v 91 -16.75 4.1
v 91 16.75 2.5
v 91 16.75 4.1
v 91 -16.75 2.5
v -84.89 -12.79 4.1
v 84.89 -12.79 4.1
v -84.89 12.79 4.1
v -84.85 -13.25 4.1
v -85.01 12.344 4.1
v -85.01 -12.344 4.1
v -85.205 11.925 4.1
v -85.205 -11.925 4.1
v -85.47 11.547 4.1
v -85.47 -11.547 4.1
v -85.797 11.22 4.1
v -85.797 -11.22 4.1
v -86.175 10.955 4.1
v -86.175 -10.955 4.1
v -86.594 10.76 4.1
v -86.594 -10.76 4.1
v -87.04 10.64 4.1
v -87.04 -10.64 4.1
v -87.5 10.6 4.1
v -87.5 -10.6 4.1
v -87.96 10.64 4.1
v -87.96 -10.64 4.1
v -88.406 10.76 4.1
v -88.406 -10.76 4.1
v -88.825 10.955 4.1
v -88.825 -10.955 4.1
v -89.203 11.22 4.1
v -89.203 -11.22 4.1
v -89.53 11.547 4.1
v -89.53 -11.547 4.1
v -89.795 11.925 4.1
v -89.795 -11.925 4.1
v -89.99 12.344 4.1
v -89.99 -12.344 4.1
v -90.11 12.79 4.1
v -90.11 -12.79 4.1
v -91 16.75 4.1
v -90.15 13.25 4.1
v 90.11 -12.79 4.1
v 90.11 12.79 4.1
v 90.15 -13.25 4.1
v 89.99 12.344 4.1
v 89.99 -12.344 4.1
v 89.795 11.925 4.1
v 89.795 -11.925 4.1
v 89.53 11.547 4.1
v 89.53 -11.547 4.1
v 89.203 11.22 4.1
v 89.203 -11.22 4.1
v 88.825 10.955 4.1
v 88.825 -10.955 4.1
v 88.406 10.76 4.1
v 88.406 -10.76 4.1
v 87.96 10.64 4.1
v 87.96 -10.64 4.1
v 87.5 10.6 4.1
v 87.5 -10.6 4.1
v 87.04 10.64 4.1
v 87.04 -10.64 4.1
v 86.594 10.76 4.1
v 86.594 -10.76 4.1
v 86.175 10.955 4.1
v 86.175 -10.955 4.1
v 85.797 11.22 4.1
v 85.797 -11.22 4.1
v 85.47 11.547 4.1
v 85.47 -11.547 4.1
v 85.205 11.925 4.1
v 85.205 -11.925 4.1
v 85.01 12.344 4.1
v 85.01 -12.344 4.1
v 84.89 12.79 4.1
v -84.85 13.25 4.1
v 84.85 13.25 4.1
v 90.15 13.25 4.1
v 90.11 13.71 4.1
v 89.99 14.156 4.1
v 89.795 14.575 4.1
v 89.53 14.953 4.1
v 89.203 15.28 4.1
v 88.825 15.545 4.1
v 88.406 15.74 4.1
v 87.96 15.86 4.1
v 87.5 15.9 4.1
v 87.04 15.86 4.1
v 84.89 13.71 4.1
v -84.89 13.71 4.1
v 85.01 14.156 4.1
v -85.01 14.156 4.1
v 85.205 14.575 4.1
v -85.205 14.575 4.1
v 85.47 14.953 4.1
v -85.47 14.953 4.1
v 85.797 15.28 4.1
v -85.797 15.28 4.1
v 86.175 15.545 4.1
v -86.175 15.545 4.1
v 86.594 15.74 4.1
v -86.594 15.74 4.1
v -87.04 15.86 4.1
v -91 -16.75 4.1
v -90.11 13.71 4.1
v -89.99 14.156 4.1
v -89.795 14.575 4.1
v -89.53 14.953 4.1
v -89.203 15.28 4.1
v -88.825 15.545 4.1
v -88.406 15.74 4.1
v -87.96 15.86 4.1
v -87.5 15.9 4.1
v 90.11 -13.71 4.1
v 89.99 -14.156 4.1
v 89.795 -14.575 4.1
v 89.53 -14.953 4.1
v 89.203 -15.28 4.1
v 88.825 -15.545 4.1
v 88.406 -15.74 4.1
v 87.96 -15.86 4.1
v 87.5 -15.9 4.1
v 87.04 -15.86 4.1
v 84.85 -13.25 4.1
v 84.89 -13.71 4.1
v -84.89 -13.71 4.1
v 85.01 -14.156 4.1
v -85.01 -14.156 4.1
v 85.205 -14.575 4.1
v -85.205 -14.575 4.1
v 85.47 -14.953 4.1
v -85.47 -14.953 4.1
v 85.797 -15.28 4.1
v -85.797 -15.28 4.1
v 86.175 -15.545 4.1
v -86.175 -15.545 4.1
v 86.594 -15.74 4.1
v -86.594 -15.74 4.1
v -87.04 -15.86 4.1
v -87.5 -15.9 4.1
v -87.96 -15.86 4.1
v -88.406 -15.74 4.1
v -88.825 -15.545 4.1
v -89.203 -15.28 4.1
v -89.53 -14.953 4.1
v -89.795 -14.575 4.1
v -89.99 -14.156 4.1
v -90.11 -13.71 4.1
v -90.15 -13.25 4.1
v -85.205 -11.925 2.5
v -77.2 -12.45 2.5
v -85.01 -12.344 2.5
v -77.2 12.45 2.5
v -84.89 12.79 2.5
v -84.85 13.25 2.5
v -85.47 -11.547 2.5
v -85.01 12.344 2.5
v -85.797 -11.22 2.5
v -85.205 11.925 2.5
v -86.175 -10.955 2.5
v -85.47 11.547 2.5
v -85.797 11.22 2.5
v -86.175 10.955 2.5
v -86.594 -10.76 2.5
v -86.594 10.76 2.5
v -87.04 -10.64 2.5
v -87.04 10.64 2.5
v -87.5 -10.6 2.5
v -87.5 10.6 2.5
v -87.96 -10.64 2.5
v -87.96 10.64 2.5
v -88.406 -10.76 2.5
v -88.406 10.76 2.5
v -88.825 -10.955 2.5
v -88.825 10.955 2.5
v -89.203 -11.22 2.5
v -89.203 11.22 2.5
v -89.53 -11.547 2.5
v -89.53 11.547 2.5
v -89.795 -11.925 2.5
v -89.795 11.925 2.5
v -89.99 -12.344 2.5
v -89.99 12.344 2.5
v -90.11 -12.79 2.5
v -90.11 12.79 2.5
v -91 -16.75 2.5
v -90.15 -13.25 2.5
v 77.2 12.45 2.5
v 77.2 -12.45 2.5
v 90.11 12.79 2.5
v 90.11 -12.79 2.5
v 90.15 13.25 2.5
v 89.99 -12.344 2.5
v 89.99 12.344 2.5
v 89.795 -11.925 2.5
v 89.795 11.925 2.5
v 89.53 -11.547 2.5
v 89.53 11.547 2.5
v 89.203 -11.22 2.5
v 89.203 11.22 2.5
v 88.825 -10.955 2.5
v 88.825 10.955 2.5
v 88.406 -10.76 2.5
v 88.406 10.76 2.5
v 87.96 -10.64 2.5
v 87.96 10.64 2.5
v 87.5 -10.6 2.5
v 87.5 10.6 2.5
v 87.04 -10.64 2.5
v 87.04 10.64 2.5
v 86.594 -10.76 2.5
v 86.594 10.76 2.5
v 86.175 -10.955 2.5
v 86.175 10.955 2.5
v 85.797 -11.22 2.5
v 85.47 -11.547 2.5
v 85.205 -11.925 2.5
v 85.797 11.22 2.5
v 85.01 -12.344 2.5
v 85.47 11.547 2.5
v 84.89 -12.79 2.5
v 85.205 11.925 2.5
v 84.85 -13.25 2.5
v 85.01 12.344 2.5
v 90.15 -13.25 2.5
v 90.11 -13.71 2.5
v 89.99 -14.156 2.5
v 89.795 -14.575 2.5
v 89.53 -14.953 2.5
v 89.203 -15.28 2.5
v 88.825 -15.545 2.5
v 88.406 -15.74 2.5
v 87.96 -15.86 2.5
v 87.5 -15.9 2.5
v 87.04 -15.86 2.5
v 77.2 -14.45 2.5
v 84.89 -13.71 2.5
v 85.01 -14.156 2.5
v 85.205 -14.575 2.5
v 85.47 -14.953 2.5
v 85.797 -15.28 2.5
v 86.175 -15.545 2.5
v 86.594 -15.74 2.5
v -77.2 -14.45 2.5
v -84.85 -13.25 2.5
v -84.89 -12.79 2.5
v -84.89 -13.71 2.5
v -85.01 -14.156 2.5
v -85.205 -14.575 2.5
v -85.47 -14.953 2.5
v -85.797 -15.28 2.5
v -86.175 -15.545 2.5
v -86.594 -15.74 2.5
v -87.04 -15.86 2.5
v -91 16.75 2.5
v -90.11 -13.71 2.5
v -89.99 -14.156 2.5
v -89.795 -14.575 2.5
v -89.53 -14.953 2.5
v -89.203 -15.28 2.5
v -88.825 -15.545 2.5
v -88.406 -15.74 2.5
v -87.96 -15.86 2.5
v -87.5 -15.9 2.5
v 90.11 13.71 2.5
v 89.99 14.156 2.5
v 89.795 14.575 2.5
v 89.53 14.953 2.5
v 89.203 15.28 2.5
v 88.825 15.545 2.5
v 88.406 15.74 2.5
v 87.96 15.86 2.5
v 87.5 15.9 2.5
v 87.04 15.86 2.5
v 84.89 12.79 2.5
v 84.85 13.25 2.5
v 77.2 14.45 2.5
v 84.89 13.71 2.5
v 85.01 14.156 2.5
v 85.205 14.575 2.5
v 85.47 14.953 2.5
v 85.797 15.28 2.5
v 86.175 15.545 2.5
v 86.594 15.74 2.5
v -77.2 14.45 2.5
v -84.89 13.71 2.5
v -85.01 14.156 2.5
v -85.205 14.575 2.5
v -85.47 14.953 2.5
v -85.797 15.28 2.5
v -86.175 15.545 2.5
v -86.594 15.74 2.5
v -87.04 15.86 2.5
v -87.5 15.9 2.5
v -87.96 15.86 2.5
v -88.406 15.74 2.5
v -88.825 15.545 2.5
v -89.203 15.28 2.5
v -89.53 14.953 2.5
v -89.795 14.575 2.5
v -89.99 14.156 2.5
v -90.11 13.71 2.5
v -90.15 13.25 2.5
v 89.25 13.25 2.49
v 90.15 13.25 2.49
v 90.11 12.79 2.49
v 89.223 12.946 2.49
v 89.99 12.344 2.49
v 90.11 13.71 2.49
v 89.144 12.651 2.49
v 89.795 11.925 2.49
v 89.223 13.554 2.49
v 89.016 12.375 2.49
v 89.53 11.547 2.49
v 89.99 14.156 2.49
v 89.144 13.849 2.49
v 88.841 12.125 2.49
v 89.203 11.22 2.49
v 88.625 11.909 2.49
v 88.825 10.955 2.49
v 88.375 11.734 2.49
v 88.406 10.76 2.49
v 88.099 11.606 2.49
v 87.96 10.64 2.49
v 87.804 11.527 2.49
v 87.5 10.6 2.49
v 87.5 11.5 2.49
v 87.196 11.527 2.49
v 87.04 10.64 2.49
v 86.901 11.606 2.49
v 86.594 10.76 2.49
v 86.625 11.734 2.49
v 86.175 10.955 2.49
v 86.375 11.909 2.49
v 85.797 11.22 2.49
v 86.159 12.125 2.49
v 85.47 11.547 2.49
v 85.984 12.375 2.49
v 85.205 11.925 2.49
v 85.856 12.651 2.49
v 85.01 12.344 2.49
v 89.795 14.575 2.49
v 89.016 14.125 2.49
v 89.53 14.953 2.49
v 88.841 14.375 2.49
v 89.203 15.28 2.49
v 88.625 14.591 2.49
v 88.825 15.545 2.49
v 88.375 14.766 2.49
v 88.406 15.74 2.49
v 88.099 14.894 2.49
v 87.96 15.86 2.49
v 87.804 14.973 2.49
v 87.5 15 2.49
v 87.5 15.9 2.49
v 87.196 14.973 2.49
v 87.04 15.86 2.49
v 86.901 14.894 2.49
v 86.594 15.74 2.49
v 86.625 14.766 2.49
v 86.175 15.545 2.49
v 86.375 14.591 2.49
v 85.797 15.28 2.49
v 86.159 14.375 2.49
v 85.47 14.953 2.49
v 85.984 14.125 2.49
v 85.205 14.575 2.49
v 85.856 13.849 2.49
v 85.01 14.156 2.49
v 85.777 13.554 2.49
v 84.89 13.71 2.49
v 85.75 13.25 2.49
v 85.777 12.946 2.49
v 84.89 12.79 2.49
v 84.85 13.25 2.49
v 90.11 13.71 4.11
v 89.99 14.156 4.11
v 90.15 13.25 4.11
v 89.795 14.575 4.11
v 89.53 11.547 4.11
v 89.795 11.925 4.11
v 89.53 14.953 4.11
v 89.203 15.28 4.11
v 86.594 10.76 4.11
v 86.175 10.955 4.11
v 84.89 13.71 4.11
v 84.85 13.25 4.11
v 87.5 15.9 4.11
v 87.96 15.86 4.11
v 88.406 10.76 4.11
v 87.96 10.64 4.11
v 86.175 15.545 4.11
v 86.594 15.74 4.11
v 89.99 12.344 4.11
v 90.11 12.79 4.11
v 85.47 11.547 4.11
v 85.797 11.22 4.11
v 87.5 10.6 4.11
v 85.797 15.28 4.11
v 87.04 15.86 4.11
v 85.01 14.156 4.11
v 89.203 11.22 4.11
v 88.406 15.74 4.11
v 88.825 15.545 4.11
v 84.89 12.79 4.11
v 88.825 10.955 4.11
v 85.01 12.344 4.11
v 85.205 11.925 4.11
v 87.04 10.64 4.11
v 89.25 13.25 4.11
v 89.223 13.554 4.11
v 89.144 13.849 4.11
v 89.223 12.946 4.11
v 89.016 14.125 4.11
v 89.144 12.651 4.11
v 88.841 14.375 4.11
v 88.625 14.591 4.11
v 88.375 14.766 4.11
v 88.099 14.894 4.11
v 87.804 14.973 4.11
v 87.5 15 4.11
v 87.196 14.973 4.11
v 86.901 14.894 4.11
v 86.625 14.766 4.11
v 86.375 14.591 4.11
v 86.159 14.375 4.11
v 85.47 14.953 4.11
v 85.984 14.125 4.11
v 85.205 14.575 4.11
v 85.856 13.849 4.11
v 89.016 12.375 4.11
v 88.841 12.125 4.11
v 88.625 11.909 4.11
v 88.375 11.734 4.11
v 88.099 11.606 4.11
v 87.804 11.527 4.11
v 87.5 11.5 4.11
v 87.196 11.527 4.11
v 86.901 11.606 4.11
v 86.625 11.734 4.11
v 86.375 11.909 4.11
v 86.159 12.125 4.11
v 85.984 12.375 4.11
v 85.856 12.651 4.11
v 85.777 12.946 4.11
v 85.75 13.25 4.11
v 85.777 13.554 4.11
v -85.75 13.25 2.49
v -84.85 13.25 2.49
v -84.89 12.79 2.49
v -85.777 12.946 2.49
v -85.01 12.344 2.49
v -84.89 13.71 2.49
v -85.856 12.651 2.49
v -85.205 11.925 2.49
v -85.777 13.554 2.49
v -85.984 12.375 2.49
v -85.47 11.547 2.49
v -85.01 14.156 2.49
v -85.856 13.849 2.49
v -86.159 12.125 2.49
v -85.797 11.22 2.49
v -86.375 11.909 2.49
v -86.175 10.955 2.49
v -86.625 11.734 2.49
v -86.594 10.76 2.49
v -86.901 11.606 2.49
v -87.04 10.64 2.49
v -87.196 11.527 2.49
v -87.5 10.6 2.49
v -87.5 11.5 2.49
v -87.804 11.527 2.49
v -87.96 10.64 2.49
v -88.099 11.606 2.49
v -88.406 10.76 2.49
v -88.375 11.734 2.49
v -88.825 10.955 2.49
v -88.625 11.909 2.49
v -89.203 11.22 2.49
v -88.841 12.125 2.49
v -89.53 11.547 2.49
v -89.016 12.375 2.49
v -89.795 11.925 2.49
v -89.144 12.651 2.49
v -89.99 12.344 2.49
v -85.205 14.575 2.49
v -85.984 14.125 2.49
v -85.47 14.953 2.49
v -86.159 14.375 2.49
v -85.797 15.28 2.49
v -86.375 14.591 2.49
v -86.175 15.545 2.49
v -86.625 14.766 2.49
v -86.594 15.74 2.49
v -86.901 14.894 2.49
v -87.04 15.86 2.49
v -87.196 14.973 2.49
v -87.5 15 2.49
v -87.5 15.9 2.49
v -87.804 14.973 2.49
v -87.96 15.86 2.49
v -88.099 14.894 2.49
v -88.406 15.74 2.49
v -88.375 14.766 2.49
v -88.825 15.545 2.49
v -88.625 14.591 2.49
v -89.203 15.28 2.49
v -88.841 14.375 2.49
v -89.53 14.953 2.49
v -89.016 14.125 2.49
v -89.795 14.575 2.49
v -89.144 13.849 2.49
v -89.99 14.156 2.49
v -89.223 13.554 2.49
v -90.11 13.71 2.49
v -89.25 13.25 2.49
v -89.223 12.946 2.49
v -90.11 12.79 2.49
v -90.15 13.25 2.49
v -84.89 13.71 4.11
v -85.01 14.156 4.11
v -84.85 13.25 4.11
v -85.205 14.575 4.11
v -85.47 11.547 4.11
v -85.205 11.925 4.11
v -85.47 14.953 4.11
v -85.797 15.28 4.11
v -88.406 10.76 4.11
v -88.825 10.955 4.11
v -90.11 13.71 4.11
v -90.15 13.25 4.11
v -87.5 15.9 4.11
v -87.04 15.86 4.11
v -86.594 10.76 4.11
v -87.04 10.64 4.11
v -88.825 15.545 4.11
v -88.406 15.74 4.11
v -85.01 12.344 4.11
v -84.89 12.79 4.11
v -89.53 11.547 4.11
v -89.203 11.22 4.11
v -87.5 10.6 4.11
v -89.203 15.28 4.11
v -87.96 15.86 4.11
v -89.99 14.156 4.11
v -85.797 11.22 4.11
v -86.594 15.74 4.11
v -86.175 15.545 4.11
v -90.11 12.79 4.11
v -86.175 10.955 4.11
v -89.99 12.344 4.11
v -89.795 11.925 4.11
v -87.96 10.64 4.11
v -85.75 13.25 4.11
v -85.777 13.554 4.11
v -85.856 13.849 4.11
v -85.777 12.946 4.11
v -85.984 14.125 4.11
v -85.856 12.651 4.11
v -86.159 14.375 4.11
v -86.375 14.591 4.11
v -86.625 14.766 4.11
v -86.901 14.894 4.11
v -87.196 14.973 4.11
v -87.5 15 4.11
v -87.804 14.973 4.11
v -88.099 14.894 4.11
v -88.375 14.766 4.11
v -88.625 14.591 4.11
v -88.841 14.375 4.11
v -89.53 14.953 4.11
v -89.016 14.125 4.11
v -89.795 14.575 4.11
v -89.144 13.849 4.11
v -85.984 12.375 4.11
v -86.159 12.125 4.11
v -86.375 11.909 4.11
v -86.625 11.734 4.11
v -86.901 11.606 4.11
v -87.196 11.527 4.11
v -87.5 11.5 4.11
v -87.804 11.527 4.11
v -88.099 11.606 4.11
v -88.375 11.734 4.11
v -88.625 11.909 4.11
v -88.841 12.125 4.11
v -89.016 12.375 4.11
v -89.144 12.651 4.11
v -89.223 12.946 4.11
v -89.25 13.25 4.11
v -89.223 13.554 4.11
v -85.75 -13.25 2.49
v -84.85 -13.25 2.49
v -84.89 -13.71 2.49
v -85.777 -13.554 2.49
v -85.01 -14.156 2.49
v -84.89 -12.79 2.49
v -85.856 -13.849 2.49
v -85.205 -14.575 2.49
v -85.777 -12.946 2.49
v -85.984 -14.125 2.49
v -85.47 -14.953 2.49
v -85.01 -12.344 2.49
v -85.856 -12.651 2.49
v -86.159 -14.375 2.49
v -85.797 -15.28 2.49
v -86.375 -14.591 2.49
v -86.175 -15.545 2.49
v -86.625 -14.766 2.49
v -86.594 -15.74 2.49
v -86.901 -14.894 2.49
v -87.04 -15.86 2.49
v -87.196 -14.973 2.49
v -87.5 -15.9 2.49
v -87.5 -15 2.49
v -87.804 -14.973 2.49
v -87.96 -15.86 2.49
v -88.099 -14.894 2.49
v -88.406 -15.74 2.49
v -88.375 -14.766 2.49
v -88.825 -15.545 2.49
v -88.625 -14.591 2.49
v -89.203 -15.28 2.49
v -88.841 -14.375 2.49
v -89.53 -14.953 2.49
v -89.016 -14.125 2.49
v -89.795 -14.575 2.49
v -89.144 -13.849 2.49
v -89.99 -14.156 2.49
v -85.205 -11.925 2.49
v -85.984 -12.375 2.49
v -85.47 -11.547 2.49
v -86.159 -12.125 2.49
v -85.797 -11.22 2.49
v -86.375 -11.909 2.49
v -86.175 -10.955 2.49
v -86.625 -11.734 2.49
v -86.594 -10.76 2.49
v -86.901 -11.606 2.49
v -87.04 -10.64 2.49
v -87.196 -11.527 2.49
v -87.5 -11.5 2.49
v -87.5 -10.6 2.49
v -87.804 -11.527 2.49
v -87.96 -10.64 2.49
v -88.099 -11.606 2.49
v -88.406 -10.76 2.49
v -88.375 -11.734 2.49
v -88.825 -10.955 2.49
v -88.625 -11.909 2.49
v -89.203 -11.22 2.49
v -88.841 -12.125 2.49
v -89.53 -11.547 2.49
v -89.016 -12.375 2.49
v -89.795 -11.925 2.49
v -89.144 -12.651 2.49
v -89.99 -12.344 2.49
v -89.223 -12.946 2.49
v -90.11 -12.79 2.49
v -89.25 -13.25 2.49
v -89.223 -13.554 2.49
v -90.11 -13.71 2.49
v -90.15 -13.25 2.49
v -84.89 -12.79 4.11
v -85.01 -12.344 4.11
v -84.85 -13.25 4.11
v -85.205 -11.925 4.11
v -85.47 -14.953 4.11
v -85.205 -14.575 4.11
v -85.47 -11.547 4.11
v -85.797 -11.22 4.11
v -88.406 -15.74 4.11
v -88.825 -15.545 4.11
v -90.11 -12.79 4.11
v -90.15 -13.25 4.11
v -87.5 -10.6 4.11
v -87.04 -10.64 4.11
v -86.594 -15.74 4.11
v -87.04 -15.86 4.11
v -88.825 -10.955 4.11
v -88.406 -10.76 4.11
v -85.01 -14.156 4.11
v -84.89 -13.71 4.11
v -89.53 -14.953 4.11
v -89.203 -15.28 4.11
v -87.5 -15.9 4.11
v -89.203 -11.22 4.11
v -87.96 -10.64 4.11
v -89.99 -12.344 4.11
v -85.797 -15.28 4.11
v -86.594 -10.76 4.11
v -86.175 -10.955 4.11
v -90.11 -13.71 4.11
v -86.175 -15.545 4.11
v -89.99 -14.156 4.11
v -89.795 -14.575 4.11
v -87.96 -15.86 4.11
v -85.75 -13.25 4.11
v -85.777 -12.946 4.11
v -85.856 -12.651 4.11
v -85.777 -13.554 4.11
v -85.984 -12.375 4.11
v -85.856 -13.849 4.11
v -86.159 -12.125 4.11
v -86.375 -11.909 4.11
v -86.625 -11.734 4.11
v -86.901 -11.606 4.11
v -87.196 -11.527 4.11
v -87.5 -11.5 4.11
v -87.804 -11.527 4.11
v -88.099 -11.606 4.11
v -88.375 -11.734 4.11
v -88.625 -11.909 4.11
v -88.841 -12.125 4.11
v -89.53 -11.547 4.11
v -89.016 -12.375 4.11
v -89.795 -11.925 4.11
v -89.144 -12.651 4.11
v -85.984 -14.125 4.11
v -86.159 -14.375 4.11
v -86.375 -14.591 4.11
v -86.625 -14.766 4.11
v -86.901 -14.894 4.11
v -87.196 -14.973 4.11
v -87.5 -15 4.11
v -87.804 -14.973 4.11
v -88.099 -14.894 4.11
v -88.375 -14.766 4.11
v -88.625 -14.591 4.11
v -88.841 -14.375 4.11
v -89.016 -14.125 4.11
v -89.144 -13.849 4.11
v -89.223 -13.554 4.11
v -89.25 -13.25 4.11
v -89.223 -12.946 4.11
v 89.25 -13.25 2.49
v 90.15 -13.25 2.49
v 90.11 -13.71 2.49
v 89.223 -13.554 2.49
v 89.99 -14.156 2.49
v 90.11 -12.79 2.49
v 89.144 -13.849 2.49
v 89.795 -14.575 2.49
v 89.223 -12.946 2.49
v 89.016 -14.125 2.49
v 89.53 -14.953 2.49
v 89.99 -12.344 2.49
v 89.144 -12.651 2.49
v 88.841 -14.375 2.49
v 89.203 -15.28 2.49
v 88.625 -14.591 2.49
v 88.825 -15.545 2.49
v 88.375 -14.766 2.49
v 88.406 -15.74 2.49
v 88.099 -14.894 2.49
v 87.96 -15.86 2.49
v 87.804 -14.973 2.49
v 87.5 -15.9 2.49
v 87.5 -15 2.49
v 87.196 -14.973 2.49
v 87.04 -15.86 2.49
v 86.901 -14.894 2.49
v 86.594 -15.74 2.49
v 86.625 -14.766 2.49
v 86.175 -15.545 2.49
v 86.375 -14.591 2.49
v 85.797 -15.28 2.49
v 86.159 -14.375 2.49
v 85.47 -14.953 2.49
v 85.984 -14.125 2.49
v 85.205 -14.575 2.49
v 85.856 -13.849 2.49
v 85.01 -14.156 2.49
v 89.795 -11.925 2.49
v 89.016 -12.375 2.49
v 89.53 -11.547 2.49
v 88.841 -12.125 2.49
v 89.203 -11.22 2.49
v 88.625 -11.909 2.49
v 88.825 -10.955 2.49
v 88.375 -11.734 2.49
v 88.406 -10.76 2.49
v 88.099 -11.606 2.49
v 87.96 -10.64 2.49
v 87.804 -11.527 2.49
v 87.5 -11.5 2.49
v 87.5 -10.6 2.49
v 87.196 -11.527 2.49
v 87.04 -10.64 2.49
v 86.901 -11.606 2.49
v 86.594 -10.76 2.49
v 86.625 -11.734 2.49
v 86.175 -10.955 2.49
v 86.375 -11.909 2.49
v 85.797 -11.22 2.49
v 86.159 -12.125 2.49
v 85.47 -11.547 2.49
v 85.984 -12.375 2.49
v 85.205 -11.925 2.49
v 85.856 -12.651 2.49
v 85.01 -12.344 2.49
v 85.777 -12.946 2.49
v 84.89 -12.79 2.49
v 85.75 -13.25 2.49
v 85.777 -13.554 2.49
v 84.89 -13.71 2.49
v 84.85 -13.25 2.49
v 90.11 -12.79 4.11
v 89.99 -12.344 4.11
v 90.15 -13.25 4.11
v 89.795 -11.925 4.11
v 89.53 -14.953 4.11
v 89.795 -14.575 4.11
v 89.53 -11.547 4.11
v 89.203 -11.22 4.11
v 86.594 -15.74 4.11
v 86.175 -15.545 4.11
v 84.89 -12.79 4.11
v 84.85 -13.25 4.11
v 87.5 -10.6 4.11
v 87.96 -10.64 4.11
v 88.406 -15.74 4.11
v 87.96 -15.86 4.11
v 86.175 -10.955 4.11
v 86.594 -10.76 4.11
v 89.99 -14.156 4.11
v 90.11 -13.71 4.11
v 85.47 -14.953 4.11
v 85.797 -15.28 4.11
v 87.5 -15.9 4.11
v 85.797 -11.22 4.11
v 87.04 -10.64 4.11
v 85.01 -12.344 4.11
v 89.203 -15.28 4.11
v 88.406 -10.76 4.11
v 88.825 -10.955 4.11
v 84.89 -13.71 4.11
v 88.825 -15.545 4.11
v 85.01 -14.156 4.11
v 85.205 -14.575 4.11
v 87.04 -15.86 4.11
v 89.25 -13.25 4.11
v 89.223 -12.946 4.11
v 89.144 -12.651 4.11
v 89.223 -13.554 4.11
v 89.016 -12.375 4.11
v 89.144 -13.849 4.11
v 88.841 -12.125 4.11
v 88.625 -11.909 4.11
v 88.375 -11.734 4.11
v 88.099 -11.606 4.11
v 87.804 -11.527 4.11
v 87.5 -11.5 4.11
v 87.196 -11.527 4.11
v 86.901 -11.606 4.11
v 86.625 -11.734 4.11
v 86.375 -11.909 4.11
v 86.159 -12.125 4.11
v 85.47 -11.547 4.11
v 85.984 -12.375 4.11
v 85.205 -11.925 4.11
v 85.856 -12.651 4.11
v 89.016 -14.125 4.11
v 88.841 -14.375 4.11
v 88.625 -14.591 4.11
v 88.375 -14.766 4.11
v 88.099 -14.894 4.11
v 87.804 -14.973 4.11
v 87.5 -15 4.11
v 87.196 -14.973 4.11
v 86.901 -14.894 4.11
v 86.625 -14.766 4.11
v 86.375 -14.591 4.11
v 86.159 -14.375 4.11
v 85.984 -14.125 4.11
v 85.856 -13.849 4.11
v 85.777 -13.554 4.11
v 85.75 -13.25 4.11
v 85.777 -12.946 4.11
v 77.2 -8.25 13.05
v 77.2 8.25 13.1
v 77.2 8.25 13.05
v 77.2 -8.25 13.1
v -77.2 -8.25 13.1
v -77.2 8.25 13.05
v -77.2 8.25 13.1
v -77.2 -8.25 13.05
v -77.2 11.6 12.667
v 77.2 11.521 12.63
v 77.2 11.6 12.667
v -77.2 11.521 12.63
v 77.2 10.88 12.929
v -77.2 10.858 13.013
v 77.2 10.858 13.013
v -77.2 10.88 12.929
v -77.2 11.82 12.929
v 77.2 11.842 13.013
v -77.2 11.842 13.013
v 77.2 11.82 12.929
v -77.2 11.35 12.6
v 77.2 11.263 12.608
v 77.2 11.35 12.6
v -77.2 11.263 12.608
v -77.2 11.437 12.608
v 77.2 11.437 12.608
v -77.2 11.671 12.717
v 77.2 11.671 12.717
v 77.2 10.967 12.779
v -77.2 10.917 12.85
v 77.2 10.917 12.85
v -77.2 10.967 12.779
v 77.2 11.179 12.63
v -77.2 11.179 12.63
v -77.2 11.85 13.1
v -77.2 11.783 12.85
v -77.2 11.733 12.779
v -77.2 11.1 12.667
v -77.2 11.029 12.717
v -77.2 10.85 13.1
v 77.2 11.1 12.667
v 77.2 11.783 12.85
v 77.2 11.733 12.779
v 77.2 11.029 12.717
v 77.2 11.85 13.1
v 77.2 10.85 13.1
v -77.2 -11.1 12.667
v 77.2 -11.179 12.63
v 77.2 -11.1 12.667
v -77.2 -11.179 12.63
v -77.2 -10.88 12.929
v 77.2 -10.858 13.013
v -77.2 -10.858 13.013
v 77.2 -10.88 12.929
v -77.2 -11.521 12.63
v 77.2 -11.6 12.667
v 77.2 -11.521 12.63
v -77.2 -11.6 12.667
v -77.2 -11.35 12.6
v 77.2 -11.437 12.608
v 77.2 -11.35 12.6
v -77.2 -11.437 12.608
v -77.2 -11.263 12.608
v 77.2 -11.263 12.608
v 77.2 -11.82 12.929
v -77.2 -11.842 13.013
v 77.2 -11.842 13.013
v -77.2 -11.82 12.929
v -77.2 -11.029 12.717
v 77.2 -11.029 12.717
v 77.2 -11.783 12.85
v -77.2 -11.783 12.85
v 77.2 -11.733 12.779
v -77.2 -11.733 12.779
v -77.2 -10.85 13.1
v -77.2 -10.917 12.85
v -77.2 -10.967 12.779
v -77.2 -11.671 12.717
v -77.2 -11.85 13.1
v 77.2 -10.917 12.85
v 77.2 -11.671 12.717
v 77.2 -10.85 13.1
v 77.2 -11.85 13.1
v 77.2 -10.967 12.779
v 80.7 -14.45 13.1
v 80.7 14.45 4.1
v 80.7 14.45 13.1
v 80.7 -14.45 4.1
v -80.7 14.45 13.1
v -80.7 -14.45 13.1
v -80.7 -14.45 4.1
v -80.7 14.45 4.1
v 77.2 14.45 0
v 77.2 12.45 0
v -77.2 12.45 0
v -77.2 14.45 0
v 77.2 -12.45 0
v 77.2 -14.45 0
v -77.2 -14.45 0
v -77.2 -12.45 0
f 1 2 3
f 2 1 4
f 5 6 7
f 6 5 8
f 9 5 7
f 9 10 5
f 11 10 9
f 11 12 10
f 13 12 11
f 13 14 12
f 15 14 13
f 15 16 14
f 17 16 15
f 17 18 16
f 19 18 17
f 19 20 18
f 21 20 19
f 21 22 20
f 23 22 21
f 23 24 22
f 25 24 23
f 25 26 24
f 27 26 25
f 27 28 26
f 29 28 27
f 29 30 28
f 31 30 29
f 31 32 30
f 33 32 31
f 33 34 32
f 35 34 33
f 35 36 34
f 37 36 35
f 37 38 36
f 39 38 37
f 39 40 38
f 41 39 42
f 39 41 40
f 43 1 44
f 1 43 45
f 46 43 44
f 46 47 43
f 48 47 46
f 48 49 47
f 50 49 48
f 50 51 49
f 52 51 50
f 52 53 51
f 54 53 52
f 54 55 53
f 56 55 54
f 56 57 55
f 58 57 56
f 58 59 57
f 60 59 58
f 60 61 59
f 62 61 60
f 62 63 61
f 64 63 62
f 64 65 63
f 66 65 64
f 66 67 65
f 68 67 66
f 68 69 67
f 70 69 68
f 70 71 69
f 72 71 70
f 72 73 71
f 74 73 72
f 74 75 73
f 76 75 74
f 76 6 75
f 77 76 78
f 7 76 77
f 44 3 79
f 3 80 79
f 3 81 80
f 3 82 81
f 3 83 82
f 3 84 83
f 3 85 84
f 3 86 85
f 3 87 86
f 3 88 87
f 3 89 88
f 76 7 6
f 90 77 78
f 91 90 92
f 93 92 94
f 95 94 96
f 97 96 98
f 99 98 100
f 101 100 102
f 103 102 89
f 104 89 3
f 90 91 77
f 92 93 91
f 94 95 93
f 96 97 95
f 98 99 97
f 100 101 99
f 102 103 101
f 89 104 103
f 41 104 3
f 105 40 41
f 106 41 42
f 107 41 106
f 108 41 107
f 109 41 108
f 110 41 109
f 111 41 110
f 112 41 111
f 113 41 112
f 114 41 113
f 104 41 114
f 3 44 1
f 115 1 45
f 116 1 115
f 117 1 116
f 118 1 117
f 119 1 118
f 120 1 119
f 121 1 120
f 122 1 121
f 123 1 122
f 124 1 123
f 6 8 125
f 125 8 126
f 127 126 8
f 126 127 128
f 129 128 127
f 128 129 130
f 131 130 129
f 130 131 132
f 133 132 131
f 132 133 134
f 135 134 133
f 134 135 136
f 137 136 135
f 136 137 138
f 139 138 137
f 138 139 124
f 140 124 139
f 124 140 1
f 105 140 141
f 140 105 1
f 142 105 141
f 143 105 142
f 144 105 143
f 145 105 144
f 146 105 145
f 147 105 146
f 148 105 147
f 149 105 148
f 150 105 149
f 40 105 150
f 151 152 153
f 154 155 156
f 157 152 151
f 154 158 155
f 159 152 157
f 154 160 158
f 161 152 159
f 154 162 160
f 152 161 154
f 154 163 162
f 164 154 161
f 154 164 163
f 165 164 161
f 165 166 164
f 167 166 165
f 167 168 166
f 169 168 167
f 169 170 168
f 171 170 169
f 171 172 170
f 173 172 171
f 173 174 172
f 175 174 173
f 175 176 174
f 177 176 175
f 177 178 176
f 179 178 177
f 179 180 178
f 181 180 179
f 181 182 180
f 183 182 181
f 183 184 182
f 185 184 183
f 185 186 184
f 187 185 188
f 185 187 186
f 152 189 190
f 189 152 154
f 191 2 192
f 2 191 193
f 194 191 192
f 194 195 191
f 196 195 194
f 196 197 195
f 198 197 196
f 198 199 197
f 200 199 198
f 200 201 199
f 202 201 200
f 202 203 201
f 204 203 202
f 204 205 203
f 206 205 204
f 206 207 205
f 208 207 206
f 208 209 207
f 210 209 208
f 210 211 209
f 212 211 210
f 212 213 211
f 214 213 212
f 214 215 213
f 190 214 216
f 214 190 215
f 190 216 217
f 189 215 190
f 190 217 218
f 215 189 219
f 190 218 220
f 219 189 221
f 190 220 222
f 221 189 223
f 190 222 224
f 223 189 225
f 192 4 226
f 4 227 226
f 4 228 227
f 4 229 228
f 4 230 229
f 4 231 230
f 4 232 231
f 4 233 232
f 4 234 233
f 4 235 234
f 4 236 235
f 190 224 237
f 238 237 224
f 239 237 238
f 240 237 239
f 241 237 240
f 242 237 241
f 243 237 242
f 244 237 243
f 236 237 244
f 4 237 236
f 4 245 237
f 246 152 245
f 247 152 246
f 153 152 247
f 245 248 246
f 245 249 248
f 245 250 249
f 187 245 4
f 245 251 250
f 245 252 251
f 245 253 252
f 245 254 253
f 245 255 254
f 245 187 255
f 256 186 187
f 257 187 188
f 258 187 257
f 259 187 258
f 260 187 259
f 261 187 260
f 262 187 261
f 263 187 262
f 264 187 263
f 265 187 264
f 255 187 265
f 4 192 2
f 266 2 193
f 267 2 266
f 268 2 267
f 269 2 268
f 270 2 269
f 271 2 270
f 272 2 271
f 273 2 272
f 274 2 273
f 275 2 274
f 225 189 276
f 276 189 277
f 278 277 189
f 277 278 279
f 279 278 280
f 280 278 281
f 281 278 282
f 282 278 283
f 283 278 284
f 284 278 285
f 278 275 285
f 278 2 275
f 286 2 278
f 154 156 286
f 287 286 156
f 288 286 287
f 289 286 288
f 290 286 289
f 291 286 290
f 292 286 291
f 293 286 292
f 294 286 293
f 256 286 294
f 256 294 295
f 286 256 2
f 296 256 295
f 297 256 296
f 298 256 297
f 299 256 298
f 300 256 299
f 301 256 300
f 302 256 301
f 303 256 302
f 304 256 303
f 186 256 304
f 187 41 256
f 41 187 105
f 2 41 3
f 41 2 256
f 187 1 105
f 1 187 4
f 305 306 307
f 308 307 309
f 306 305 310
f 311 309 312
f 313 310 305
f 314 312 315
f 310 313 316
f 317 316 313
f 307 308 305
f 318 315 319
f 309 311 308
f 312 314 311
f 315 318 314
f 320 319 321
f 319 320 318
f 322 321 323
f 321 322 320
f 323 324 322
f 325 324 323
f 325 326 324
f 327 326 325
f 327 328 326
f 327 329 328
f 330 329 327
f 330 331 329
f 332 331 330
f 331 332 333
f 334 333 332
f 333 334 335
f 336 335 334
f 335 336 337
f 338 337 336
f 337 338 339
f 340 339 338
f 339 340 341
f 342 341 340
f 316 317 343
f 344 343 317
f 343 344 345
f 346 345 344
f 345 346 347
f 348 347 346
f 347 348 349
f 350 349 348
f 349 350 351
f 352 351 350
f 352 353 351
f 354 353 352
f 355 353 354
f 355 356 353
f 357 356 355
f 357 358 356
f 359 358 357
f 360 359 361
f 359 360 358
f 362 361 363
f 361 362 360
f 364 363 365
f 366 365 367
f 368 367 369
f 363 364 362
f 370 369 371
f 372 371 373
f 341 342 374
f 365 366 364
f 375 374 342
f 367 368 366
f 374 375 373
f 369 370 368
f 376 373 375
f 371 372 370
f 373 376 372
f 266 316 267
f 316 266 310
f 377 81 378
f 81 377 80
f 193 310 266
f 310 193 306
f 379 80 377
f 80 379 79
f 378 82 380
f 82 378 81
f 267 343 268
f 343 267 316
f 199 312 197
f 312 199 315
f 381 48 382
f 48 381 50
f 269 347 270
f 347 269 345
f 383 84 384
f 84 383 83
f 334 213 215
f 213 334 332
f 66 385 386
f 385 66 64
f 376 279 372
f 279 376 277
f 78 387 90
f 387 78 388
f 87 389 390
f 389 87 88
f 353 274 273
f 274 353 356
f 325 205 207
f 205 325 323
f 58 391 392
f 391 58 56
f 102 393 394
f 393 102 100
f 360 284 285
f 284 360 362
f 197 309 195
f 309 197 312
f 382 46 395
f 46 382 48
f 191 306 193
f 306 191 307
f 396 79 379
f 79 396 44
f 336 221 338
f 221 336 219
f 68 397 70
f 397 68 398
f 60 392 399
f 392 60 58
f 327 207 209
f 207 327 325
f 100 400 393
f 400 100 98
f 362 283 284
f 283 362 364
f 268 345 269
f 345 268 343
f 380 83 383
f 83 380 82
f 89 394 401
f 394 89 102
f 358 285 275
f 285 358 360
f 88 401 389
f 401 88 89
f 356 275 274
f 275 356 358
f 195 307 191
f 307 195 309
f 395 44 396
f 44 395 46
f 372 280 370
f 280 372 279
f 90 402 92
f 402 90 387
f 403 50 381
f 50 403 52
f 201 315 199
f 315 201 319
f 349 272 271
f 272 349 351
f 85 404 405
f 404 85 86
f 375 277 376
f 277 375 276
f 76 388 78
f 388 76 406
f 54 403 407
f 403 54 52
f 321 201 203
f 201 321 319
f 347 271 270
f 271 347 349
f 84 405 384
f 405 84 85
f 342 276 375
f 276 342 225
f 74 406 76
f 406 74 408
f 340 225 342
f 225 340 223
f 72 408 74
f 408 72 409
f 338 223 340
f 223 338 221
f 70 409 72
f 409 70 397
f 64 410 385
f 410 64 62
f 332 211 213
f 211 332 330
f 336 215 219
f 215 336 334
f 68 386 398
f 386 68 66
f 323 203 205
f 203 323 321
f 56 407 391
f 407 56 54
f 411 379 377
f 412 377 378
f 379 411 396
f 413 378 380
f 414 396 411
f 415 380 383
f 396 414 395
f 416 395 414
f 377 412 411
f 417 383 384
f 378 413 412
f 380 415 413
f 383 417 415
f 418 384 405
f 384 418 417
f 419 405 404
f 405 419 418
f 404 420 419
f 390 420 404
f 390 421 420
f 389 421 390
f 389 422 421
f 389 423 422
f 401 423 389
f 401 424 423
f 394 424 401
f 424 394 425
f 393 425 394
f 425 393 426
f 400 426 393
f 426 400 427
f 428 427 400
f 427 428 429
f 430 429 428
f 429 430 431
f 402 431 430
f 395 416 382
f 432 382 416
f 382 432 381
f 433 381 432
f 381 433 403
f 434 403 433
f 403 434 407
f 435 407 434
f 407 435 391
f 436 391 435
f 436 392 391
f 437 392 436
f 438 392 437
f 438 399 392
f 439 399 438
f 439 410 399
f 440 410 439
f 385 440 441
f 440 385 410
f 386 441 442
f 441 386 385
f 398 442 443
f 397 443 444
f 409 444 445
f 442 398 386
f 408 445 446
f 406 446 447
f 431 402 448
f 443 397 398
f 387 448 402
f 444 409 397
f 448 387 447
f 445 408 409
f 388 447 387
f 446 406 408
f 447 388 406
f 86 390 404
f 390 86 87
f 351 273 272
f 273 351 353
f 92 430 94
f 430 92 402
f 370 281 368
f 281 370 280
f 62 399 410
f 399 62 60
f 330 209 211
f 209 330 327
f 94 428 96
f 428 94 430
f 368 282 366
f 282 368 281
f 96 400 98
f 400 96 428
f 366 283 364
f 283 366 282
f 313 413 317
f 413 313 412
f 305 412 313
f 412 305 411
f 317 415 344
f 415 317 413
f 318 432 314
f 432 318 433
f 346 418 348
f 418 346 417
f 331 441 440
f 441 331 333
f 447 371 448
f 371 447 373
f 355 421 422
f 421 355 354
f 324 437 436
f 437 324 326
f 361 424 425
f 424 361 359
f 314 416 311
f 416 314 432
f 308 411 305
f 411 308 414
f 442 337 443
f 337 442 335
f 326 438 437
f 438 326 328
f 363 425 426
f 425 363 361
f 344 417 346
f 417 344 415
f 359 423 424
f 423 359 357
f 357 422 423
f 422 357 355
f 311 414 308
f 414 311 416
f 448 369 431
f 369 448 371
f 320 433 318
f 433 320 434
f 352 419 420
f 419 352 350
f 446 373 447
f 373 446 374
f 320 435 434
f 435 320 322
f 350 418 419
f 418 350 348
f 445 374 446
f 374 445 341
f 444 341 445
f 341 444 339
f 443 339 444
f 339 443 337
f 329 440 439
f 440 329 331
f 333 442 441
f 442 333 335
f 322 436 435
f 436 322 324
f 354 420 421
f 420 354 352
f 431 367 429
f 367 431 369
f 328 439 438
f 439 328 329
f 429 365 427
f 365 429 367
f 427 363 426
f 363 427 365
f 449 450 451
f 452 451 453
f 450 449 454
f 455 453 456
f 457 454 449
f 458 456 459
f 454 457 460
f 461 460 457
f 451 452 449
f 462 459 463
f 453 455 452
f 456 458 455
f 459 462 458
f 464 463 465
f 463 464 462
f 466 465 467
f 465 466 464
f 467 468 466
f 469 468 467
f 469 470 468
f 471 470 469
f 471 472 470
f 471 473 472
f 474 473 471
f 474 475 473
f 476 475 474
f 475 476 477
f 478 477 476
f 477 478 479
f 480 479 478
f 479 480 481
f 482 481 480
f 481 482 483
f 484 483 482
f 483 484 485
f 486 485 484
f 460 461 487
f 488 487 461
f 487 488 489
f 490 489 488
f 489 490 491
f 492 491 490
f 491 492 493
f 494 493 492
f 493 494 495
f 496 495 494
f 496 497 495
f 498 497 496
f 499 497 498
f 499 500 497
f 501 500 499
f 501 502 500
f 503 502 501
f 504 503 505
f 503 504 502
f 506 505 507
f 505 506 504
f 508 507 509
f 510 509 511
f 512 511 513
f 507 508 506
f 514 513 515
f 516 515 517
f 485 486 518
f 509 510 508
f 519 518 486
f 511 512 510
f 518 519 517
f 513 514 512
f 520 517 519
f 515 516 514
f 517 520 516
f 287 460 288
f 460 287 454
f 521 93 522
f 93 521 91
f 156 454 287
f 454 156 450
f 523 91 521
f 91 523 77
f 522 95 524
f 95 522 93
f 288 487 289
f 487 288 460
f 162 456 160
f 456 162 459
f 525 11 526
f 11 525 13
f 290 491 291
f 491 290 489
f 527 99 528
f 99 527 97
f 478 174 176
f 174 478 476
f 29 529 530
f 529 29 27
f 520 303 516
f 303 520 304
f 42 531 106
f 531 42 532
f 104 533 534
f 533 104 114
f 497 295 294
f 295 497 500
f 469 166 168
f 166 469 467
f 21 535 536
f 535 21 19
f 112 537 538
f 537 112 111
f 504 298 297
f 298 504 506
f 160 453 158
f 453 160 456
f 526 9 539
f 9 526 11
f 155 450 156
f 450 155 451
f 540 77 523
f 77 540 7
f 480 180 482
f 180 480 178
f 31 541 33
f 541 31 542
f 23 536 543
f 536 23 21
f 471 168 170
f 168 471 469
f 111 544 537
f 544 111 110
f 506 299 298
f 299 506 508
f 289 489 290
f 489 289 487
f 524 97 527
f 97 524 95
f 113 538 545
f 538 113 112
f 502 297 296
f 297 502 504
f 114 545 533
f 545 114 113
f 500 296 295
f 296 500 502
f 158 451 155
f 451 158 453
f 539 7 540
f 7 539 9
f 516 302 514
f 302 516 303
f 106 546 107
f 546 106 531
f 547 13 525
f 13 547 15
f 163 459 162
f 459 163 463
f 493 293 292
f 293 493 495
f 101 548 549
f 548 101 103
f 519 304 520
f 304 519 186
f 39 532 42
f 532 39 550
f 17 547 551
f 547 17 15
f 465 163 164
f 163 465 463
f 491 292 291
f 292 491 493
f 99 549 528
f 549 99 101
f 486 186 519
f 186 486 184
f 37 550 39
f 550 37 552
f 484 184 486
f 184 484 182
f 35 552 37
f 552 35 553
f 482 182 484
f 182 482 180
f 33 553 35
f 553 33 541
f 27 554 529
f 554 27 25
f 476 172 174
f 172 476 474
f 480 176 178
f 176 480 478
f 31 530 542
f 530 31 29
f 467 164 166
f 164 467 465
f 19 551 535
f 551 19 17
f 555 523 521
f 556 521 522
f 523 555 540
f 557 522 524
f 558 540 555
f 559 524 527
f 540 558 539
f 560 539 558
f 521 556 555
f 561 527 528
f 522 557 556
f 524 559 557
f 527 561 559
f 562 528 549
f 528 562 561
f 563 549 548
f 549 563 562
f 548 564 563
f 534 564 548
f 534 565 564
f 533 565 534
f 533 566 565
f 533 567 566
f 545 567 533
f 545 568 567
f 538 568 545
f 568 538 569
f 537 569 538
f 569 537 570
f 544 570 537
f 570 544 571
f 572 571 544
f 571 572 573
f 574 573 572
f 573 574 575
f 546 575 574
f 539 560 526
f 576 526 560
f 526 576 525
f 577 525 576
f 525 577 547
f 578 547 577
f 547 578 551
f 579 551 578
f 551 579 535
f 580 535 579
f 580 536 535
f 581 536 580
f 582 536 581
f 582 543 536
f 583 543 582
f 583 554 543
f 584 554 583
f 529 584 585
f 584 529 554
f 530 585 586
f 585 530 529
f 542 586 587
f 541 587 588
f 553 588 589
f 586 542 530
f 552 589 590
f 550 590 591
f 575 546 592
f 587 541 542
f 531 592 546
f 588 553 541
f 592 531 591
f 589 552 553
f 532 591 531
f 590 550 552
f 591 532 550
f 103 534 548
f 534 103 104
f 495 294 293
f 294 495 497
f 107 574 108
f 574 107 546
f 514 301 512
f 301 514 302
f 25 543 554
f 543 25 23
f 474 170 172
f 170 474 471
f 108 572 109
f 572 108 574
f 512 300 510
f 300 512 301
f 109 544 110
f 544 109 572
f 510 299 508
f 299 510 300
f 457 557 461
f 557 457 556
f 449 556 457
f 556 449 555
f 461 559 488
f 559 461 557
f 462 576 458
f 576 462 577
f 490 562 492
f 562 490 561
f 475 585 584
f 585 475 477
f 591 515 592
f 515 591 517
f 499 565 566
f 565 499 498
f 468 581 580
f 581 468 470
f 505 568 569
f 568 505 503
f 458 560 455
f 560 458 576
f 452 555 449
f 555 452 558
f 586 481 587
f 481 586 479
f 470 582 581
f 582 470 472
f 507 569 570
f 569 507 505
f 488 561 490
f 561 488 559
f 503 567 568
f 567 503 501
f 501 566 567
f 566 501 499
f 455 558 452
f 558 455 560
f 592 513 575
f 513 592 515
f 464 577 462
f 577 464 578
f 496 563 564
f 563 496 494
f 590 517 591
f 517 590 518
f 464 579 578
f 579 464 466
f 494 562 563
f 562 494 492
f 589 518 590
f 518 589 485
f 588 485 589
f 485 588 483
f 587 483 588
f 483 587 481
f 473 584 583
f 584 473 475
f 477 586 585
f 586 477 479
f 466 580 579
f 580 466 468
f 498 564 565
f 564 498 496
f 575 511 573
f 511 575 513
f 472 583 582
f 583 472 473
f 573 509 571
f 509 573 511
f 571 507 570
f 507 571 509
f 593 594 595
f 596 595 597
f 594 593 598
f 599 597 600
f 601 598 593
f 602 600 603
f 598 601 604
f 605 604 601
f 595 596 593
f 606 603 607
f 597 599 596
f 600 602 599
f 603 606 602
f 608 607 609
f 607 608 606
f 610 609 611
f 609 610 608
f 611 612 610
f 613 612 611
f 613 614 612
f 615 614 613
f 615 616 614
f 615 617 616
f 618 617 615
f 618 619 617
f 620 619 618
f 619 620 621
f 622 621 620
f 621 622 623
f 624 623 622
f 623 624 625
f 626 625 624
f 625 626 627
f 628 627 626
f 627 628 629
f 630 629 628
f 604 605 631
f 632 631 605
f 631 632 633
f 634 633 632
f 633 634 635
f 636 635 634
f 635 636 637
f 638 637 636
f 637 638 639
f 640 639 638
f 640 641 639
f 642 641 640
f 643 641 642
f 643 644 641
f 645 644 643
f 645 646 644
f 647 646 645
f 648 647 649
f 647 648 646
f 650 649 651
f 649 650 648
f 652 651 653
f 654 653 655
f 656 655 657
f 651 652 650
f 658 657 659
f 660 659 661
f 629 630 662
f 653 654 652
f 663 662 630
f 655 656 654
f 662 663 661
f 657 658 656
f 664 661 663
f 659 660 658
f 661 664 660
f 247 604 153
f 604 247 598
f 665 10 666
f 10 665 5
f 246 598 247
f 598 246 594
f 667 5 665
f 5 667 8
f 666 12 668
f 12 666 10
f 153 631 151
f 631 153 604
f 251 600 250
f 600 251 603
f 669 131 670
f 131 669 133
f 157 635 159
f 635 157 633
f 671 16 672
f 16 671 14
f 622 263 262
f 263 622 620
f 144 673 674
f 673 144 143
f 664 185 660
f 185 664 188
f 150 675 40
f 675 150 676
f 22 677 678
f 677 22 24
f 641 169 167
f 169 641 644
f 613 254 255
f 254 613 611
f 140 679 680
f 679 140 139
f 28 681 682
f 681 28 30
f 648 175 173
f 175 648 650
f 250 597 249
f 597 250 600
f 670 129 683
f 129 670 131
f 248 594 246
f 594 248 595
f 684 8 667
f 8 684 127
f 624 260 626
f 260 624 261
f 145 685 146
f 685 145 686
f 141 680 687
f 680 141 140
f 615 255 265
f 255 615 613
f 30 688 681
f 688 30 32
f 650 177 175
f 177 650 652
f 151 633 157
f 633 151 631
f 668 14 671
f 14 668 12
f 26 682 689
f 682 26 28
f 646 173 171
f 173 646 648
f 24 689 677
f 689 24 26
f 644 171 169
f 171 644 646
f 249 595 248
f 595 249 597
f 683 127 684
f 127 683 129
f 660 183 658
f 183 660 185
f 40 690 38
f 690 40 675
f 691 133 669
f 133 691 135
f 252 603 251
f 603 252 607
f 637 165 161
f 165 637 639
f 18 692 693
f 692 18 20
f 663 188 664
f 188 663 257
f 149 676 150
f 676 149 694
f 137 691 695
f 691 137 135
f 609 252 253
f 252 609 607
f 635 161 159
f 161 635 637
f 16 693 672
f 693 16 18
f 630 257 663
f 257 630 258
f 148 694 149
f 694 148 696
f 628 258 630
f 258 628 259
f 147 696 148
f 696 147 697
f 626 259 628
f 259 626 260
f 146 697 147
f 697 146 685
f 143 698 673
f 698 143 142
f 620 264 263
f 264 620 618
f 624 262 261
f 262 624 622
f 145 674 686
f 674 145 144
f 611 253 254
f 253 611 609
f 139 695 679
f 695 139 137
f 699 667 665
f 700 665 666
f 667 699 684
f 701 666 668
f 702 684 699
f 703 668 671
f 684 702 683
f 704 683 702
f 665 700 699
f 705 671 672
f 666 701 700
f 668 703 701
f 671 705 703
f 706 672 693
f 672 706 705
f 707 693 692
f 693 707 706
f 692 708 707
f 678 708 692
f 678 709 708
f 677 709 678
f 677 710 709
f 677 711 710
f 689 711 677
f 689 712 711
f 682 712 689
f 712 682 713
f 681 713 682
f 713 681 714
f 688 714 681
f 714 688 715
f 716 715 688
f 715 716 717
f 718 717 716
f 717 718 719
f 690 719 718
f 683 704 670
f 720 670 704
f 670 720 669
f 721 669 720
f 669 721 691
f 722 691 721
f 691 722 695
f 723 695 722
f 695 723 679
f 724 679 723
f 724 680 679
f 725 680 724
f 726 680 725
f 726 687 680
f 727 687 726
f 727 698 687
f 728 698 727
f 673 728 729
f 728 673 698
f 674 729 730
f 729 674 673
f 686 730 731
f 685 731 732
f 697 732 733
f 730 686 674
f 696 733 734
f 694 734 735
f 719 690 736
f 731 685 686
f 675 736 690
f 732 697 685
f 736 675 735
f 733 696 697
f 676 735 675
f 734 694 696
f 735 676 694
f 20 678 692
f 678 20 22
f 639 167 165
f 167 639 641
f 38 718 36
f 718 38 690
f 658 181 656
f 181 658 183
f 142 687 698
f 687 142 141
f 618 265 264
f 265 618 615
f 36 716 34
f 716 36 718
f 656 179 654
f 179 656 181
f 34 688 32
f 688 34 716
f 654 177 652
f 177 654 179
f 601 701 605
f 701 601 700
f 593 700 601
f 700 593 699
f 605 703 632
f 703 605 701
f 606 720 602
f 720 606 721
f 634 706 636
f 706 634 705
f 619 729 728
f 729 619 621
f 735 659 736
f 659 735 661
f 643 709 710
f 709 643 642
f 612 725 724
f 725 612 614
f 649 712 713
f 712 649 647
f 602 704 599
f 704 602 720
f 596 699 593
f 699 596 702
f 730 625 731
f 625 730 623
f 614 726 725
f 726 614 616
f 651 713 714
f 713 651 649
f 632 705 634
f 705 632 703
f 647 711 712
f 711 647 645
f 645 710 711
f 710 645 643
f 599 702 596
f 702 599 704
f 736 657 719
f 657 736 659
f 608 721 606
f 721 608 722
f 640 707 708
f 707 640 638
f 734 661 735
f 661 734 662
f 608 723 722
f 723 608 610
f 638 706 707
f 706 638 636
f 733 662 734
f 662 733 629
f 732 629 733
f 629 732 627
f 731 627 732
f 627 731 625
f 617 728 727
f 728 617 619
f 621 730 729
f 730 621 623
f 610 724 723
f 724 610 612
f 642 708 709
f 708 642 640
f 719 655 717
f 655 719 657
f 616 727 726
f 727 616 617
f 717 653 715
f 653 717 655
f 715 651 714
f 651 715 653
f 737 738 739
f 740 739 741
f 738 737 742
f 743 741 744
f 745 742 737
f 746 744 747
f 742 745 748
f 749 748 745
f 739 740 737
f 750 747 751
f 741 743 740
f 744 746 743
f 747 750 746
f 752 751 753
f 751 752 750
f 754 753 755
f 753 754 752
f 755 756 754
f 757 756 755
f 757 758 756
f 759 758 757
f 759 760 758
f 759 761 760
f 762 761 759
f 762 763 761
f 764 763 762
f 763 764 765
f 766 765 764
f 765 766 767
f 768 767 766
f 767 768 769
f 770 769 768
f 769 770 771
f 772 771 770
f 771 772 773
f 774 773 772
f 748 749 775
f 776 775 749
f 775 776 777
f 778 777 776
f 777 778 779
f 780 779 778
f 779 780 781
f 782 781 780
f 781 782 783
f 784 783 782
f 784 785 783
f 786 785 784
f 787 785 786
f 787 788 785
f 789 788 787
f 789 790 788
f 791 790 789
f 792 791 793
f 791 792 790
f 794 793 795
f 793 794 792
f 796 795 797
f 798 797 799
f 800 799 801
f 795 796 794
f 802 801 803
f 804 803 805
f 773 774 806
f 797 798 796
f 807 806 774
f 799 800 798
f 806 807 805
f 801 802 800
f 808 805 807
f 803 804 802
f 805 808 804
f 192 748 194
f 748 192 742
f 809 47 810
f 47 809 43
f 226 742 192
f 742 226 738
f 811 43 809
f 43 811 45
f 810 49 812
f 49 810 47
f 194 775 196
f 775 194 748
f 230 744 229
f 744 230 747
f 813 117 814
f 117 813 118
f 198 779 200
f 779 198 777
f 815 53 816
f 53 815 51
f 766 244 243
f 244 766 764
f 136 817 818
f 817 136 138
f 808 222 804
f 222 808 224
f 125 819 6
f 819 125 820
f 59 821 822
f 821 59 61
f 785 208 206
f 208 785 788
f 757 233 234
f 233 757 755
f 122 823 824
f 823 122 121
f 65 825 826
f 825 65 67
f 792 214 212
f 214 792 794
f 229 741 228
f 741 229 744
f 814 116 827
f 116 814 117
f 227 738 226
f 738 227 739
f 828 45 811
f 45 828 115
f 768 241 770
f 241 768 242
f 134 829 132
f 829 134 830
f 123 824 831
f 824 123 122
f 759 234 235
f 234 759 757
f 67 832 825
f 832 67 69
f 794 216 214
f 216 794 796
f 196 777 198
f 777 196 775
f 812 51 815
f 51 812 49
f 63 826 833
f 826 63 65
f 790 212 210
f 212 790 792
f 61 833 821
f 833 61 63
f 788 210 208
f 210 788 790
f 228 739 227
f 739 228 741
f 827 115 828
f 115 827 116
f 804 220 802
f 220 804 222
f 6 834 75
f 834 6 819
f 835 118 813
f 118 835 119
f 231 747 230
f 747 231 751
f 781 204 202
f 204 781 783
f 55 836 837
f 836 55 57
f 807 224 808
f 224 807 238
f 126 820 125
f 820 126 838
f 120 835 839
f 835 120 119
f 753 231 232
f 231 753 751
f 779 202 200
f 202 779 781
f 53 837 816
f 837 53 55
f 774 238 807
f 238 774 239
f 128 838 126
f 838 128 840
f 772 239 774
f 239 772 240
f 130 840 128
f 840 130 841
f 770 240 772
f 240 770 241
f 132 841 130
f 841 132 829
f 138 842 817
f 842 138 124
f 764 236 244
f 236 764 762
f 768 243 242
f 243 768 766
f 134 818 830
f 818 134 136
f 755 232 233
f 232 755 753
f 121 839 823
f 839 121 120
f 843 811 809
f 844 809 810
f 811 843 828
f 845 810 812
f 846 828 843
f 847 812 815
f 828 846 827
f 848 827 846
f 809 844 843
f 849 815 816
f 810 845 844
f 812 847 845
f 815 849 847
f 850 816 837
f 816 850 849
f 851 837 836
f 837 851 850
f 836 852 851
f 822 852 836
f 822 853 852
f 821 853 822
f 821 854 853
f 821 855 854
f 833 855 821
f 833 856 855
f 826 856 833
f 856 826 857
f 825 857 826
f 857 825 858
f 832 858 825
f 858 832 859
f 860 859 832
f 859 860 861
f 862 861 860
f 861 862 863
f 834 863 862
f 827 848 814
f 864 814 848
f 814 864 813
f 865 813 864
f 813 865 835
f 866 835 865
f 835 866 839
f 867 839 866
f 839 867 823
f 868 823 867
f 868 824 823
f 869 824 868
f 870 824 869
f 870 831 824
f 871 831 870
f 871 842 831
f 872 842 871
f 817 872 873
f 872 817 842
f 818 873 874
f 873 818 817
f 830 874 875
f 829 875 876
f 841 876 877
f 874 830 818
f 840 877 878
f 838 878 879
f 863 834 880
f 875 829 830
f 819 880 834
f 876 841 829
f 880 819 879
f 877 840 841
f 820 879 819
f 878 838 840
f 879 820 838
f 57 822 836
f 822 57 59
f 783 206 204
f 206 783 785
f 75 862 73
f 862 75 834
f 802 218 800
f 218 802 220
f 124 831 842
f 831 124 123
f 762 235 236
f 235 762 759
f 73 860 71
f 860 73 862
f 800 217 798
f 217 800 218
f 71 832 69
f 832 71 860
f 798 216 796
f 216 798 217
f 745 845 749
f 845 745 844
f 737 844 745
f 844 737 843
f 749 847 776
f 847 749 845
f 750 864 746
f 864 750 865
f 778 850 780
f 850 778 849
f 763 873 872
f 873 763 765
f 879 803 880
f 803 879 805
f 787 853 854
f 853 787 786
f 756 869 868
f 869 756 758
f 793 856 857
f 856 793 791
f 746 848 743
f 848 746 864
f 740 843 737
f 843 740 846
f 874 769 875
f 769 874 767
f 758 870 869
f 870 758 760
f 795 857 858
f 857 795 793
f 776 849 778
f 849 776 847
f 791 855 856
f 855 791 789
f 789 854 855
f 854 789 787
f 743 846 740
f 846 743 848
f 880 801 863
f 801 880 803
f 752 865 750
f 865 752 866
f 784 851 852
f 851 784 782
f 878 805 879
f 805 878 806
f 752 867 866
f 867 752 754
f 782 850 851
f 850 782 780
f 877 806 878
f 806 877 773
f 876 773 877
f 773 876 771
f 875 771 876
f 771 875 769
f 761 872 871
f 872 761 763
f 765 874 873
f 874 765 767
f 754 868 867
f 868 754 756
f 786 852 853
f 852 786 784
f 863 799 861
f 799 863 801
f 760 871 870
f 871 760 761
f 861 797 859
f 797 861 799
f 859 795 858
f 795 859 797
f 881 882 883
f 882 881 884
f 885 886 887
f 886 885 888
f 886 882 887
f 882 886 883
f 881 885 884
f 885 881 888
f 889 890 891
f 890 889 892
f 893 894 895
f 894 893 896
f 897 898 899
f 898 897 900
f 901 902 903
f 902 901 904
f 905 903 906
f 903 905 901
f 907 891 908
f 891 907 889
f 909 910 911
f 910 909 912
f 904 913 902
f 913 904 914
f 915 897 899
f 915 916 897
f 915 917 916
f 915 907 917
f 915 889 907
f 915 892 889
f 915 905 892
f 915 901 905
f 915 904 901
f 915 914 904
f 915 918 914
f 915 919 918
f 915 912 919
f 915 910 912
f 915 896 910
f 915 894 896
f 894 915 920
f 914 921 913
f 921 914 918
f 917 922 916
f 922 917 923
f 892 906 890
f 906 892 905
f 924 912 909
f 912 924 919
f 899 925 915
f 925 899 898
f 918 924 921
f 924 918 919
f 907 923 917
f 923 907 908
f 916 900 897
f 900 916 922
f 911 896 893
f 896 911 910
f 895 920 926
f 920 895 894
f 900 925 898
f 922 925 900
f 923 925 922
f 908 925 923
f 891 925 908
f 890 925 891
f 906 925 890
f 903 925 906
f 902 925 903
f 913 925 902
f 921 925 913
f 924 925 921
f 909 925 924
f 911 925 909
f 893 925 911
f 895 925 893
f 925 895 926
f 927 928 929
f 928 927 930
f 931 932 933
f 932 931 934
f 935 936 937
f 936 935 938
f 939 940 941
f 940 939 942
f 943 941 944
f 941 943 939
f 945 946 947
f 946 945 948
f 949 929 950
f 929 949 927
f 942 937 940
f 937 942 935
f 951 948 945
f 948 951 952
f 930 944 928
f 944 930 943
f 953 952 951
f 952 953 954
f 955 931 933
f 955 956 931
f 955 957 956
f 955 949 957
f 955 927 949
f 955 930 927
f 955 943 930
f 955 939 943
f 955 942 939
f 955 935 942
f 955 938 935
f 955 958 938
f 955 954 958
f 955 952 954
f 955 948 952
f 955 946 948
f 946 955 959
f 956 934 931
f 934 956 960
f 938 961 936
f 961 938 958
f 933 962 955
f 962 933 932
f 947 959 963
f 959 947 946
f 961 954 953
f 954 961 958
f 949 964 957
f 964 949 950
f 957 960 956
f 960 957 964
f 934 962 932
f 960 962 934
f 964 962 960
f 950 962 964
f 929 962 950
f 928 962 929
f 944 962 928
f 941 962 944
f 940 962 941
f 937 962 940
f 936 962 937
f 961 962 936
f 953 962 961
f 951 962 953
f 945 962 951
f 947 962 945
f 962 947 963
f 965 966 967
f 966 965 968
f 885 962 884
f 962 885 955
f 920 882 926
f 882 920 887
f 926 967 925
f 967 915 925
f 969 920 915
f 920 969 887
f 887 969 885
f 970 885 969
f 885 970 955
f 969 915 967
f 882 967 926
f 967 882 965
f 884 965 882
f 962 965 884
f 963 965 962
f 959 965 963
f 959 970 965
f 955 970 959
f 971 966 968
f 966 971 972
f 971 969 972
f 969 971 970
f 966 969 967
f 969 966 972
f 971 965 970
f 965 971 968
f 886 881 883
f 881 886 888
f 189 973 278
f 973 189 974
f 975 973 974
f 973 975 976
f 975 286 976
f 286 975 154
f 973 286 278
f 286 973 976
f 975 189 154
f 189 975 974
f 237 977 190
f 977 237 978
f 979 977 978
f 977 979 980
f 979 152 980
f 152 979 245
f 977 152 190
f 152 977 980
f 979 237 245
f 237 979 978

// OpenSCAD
// file: proto/lcd_module.scad
/*
OpenSCAD Model:  LCD module

Parameters:
  W   - module width
  H   - module height
  t   - DPS thickness
  BW  - display body width
  BH  - display body height
  DW  - display area width
  DH  - display area height
  th  - total height
  dh  - distance from module botom  to top of DPS
  cpd - corner hole copper diameter
  chd - corner hole diameter
  cx  - horizontal distance of corner holes
  cy  - vertical distance of corner holes
  px  - distance of 1st pad center from left
  py  - distance of 1st pad center from yop
  ppd - connection pad diameter
  phd - connection pad hole diameter
  pdt - connection pads pitch
  n   - number of connection pads
*/

module lcd_module (
		W=80,
		H=36,
		t=1.76,
		BW=71.2,
		BH=26.2,
		DW=66,
		DH=16,
		th=8.9,
		dh=4.8,
		cpd=5,
		chd=2.5,
		cx=75,
		cy=31,
		px=8,
		py=2,
		ppd=2,
		phd=1,
		pdt=2.54,
		n=16
	) {
	module cpad(tr) {
		color ([1,1,0]) translate (tr) difference () {
			cylinder(r=cpd/2-0.1,h=t+0.02,center=true,$fn=36);
			cylinder(r=chd/2,h=t+0.2,center=true,$fn=36);
		}
	}

	module pad(tr) {
		color ([1,1,0]) translate (tr) difference () {
			union () {
				translate([0,(py-0.1)/2,0]) cube([ppd,py-0.1,t+0.02],center=true);
				cylinder(r=ppd/2,h=t+0.02,center=true,$fn=36);
			}
			cylinder(r=phd/2,h=t+0.2,center=true,$fn=36);
		}
	}

	translate([0,0,(th-dh)-t/2]) union () {
		color ([0,0.5,0])  difference () {
			cube([W,H,t],center=true);
			union () {
				translate([cx/2,cy/2,0]) cylinder(r=chd/2+0.1,h=t+0.2,center=true,$fn=36);
				translate([-cx/2,cy/2,0]) cylinder(r=chd/2+0.1,h=t+0.2,center=true,$fn=36);
				translate([-cx/2,-cy/2,0]) cylinder(r=chd/2+0.1,h=t+0.2,center=true,$fn=36);
				translate([cx/2,-cy/2,0]) cylinder(r=chd/2+0.1,h=t+0.2,center=true,$fn=36);
				if (n>0) {for (i=[1:n]) {
					translate([-W/2+px+(i-1)*pdt,H/2-py,0]) cylinder(r=(phd/2)+0.1,h=t+0.2,center=true,$fn=36);
				}}
			}
		}
		cpad([cx/2,cy/2,0]);
		cpad([-cx/2,cy/2,0]);
		cpad([-cx/2,-cy/2,0]);
		cpad([cx/2,-cy/2,0]);
		if (n>0) { for (i=[1:n]) {
			pad([-W/2+px+(i-1)*pdt,H/2-py,0]);
		}}
		color ([0.9,0.9,0.9]) translate ([0,0,dh/2+t/2])
		difference () {
		 cube([BW,BH,dh],center=true);
			union () {
				translate([0,0,dh/2-0.45]) cube([DW,DH,1],center=true);
				translate([0,(DH+BH)/4,dh/2]) rotate(90,[0,1,0]) cylinder(r=0.5,h=DW,center=true,$fn=36);
				translate([0,-(DH+BH)/4,dh/2]) rotate(90,[0,1,0]) cylinder(r=0.5,h=DW,center=true,$fn=36);
			}
		}
		color ([0.2,0.3,0])  translate([0,0,dh+t/2-0.55]) cube([DW,DH,1],center=true);
		color ([0,0,0]) translate ([0,BH/2-1,-((th-dh)-t)/2-t/2]) cube([DW,2,((th-dh)-t)],center=true);
		color ([0,0,0]) translate ([0,-(BH/2-1),-((th-dh)-t)/2-t/2]) cube([DW,2,((th-dh)-t)],center=true);
	}
}
// main file
include <proto/lcd_module.scad>

lcd_module(
		W=182,
		H=33.5,
		t=1.6,
		BW=161.4,
		BH=28.9,
		DW=154.4,
		DH=16.5,
		th=13.1,
		dh=9.0,
		cpd=5.5,
		chd=3.5,
		cx=175,
		cy=26.5,
		px=10,
		py=2.5,
		ppd=2,
		phd=1,
		pdt=2.54,
		n=0
);
